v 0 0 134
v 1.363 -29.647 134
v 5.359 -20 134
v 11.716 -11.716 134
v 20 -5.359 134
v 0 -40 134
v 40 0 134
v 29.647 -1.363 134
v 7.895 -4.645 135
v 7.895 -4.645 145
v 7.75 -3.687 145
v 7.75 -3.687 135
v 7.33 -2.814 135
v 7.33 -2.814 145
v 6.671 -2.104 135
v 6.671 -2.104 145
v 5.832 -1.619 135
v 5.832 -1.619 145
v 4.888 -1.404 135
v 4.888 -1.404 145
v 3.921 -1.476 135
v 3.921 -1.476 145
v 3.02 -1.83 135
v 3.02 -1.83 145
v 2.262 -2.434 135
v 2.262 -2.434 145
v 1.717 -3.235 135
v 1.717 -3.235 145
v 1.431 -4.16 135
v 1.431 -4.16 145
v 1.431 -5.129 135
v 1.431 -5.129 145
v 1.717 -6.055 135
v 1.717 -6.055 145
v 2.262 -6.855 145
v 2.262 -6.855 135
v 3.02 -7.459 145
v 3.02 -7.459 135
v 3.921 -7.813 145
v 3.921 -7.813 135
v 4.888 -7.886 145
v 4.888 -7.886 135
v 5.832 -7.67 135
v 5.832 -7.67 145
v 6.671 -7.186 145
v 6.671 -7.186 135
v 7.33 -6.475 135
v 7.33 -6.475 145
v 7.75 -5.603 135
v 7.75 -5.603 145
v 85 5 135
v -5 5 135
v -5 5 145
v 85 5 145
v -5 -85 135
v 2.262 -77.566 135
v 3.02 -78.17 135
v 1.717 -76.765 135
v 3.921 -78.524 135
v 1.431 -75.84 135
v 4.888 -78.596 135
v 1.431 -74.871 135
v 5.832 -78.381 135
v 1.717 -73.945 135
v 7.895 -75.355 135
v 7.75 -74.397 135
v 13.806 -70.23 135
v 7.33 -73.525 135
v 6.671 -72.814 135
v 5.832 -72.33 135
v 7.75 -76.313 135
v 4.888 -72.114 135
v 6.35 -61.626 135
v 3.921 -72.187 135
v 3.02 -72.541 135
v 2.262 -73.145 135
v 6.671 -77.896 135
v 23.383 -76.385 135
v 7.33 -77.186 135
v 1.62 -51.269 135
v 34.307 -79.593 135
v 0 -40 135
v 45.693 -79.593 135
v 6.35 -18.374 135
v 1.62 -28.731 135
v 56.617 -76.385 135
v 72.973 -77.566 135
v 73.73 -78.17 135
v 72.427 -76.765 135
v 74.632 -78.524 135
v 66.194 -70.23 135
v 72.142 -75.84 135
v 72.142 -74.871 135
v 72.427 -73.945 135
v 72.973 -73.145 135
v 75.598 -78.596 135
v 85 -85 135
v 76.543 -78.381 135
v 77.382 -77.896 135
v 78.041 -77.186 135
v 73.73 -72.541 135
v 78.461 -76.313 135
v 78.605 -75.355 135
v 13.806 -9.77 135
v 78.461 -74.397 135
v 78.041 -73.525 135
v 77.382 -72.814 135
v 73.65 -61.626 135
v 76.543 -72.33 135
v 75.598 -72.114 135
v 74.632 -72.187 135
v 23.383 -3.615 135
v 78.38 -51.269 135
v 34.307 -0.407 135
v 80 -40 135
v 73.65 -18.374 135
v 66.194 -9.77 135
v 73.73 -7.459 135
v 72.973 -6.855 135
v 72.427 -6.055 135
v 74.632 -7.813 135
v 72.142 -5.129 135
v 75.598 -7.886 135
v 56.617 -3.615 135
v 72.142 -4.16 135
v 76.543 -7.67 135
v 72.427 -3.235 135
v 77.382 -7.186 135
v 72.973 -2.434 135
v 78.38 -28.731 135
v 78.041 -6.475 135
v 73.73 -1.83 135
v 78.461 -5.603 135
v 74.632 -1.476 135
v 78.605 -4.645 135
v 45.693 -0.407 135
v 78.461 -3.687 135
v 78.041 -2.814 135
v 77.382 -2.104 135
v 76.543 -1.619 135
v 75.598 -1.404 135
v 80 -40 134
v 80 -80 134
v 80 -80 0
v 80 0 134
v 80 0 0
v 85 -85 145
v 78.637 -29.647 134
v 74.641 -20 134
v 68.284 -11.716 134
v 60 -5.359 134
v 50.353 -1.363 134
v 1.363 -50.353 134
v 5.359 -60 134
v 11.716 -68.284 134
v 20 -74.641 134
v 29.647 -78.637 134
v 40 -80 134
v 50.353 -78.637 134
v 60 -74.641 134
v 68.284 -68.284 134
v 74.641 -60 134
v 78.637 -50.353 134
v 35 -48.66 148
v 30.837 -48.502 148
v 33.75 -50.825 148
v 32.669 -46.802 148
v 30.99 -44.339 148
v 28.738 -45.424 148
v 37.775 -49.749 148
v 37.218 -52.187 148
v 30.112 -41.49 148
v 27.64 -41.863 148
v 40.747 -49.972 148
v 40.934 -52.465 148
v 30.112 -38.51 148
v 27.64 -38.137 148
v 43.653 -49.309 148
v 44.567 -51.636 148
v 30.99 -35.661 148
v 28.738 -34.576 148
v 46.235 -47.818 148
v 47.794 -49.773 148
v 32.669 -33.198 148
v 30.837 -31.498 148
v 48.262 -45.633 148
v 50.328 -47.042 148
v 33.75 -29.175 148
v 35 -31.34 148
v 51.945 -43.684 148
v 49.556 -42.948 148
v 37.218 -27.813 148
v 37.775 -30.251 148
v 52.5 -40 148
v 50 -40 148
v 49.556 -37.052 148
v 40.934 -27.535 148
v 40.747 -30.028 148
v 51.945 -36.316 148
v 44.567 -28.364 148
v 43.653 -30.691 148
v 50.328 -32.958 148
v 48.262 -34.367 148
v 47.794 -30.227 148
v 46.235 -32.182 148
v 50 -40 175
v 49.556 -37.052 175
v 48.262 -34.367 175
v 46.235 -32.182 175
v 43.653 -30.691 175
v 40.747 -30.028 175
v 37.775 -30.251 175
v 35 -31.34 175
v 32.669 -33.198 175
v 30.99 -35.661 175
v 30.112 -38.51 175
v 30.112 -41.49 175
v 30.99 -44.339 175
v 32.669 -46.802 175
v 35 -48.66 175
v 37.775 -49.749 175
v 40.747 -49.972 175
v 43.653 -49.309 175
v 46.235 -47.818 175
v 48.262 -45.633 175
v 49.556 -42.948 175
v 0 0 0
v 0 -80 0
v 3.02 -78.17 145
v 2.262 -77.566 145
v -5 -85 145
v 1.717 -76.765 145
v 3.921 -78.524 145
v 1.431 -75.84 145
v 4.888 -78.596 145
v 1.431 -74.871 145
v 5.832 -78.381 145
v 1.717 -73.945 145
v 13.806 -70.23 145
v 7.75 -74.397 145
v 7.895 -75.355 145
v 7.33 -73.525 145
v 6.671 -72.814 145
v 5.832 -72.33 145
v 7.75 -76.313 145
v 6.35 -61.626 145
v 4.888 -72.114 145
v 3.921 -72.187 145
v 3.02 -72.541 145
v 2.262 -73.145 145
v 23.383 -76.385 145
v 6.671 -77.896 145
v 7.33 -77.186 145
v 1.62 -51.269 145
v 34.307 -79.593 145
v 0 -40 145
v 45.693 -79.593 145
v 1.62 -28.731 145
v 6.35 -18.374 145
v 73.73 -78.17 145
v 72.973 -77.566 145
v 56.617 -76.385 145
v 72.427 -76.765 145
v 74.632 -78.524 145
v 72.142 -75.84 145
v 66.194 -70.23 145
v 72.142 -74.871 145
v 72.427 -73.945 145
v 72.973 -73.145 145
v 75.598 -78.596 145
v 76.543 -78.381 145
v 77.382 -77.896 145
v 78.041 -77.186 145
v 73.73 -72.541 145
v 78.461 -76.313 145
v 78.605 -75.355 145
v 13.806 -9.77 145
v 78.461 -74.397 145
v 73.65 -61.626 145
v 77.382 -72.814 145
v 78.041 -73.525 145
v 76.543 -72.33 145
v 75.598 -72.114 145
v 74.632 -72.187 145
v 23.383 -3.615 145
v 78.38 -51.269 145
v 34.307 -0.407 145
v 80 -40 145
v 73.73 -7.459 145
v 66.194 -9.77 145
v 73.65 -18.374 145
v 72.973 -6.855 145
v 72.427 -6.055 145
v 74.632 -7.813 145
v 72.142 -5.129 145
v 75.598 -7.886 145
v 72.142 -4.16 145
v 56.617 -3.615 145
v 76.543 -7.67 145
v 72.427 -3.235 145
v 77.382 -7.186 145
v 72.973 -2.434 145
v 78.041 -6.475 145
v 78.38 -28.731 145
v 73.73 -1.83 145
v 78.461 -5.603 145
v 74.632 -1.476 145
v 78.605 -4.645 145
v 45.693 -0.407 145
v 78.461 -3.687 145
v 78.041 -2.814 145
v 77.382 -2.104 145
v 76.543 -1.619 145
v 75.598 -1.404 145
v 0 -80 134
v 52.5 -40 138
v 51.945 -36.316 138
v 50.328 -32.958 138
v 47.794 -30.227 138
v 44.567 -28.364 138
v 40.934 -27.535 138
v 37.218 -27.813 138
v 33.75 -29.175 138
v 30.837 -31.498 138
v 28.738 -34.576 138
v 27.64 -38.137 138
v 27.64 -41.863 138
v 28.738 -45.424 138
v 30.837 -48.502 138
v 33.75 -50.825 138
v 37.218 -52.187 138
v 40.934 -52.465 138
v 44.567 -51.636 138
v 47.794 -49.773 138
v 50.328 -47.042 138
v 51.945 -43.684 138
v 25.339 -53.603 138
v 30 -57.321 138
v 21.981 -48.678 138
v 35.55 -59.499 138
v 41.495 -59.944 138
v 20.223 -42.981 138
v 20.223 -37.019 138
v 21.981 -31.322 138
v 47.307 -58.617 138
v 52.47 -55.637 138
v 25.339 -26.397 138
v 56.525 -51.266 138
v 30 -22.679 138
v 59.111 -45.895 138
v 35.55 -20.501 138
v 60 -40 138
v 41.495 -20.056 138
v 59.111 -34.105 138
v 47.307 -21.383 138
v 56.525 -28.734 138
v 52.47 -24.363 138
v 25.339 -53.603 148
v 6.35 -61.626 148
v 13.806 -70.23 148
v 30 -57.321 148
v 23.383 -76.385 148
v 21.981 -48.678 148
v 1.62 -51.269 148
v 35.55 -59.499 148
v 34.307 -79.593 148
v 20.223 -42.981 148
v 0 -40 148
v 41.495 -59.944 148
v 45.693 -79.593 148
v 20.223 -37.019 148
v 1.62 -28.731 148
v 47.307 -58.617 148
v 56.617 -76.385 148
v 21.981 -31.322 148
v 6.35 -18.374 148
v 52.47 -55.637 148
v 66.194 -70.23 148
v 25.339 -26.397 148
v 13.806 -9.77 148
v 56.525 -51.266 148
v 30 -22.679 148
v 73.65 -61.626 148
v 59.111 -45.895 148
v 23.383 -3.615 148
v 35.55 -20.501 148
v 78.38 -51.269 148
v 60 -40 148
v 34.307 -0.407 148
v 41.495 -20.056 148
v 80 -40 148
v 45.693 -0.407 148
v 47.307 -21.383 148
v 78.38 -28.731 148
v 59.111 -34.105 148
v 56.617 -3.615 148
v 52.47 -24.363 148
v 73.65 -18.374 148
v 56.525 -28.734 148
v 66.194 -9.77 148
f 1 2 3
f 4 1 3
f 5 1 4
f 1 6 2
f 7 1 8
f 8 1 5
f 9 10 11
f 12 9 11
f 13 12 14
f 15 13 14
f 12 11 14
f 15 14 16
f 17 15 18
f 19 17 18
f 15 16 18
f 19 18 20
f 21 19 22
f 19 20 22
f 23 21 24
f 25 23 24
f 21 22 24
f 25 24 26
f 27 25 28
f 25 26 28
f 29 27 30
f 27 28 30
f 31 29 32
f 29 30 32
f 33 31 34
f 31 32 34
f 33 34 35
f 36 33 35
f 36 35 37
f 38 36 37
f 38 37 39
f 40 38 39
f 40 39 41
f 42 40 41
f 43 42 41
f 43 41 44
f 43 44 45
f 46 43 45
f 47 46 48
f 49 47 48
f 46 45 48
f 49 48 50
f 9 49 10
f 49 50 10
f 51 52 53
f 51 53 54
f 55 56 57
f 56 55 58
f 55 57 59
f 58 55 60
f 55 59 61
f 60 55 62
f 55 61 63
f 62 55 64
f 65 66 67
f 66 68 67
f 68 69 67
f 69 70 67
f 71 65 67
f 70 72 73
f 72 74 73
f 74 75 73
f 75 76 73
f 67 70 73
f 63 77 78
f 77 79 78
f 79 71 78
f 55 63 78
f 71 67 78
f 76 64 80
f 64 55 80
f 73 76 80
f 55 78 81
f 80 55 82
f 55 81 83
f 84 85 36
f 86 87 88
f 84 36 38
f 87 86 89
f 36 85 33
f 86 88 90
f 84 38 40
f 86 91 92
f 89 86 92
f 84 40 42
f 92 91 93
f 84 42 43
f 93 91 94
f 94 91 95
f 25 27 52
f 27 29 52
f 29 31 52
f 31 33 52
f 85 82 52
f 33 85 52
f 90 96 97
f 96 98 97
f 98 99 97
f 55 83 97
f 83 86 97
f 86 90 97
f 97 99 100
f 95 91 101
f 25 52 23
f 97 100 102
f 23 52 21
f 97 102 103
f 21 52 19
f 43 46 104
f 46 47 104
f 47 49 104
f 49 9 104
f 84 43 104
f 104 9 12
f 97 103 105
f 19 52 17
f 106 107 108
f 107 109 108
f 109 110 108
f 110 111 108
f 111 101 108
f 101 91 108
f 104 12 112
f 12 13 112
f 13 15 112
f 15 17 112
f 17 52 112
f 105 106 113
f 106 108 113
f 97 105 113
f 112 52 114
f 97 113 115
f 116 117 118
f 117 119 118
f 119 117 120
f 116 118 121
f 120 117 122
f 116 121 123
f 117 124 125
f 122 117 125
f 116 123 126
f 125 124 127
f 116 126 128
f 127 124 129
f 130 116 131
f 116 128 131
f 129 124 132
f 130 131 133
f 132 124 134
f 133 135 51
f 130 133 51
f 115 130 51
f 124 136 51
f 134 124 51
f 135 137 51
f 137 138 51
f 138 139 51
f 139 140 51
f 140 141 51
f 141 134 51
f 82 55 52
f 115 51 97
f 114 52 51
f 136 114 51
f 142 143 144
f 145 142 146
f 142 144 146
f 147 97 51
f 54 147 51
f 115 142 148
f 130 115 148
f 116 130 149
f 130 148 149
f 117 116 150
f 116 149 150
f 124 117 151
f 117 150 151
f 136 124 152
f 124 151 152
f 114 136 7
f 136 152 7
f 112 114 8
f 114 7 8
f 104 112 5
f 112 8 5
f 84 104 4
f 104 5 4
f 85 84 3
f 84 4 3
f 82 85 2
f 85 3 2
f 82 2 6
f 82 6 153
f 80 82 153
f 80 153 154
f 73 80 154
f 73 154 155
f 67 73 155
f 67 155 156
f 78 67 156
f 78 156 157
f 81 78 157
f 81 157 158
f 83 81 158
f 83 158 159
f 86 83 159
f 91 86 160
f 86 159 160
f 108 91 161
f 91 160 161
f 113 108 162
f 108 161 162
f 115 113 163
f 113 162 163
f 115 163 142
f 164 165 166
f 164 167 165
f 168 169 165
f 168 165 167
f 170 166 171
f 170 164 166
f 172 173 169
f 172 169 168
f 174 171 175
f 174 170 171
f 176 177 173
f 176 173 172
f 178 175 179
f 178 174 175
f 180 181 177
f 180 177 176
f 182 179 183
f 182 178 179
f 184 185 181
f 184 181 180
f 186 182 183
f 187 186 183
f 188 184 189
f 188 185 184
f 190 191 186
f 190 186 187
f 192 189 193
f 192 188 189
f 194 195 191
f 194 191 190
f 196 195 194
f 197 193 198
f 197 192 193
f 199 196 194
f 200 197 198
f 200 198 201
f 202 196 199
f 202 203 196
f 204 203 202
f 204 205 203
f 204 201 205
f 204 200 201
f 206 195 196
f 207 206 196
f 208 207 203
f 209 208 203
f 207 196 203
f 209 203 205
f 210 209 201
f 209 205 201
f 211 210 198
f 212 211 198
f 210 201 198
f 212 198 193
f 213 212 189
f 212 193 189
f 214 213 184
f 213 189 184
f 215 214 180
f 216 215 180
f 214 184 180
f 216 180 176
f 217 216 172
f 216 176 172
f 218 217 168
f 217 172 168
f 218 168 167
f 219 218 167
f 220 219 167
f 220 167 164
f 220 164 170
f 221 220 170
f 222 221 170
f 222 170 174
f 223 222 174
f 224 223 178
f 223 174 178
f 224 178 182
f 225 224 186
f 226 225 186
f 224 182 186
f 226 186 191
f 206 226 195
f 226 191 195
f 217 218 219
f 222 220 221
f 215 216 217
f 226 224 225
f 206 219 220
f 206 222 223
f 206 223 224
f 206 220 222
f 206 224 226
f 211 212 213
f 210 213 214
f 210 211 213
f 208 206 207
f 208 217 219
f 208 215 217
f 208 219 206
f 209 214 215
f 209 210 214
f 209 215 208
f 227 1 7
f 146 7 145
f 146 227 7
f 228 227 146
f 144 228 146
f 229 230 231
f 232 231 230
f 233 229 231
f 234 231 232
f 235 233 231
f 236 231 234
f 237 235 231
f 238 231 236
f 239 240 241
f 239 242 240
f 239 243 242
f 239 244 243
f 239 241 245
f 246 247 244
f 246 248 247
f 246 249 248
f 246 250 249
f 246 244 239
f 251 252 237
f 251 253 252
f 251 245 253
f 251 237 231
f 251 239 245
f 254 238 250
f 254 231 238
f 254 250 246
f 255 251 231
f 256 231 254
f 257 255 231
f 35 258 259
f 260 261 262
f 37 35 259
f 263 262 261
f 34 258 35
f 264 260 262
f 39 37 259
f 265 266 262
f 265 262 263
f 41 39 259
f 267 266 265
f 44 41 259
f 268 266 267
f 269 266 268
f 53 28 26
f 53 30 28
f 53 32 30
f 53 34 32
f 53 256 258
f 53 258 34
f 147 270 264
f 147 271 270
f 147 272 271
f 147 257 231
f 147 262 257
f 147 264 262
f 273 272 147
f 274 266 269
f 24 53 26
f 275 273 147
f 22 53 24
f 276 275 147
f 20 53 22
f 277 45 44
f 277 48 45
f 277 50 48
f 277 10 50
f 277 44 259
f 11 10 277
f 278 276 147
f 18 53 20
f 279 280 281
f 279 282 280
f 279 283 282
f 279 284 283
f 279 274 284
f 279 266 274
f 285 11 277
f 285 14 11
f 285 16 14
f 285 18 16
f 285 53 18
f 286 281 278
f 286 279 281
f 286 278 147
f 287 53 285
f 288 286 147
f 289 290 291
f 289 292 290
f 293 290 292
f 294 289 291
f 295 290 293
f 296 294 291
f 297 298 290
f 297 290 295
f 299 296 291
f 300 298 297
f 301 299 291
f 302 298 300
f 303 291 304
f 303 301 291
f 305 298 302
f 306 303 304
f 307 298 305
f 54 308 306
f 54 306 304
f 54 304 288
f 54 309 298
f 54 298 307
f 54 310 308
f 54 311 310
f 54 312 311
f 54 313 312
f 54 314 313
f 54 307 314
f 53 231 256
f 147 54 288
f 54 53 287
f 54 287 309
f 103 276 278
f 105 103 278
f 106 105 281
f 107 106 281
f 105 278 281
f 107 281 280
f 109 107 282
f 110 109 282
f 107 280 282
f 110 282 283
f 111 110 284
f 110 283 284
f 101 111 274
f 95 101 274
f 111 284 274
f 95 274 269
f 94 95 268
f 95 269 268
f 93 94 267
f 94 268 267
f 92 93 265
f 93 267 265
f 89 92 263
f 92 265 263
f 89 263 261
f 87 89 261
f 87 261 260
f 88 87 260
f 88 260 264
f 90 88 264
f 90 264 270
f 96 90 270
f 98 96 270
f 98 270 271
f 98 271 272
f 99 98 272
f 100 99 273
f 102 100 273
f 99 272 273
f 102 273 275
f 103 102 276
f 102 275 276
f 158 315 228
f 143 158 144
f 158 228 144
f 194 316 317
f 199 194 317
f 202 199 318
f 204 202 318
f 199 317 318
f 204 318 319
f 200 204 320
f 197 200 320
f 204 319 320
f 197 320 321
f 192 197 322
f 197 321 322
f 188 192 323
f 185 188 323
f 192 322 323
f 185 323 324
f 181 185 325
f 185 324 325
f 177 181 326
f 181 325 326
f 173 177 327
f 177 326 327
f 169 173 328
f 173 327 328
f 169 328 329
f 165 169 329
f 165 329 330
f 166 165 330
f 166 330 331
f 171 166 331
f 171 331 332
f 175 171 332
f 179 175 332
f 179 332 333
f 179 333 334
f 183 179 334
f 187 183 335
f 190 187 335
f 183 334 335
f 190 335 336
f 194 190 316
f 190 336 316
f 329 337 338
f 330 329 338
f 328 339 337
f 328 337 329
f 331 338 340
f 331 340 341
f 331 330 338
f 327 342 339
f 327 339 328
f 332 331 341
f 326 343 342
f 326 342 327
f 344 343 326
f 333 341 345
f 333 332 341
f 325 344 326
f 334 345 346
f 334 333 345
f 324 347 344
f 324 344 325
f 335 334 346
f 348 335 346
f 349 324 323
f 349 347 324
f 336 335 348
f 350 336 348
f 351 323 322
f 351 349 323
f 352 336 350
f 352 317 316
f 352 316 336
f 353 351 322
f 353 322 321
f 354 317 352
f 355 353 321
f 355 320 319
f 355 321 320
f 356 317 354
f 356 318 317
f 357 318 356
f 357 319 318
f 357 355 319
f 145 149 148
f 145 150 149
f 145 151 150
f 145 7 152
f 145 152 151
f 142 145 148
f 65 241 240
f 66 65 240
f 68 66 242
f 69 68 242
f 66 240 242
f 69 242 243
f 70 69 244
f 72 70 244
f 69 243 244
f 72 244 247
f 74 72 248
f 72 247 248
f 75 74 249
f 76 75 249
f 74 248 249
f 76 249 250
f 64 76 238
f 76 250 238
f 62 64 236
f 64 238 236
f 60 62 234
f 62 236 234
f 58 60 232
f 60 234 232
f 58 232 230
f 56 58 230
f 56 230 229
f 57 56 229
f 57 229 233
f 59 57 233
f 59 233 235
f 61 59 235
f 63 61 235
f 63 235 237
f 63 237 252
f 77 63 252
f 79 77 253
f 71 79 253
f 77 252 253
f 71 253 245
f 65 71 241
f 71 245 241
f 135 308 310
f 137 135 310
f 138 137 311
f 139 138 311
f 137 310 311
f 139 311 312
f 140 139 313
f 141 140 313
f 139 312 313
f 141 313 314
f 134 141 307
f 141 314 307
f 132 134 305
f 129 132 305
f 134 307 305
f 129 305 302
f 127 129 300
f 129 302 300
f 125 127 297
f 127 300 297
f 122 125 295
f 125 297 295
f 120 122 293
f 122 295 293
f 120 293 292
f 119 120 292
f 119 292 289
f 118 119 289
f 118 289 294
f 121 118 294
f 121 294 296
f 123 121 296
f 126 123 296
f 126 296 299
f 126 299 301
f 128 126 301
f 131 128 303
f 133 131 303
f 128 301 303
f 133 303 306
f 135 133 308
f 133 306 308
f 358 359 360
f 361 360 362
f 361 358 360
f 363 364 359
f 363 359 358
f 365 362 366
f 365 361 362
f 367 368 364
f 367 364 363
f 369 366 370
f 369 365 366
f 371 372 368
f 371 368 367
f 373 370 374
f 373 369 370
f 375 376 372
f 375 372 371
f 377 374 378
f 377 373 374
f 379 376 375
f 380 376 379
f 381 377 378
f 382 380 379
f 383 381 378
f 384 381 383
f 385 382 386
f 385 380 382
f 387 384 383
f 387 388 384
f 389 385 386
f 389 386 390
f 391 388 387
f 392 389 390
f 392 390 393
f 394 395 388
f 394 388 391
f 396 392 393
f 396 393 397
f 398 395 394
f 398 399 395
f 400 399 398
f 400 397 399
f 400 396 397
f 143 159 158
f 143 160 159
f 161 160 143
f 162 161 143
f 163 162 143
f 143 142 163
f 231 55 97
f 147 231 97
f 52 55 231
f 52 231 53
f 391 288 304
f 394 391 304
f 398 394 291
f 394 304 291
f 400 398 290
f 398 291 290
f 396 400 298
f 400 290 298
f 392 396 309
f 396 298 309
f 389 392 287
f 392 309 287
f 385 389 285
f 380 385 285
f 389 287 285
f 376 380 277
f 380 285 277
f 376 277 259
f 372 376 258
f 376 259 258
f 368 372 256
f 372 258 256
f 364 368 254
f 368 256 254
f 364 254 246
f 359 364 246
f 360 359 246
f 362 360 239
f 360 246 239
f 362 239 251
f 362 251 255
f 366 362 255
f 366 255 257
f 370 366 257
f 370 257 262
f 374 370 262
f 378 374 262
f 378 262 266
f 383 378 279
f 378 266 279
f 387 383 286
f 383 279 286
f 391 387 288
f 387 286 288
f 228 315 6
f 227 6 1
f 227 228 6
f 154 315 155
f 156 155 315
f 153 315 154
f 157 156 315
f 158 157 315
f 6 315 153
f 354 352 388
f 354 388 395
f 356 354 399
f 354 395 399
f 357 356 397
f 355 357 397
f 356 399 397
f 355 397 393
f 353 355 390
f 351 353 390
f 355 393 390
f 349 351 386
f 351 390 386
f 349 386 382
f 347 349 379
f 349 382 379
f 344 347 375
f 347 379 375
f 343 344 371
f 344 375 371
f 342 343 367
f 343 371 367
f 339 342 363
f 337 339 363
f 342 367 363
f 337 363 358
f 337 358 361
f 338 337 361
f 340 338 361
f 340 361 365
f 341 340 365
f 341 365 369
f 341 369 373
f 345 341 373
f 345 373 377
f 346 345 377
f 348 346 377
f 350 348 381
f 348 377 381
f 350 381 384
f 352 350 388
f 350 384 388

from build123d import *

# Parameters (mm, degrees)
SKETCH_1_W          = 80
SKETCH_1_H          = 80
EXTRUDE_1_DEPTH     = 134
SKETCH_2_R          = 40
EXTRUDE_2_DEPTH     = 1
SKETCH_3_W          = 90
SKETCH_3_H          = 90
EXTRUDE_3_DEPTH     = 10
SKETCH_4_R          = 40
EXTRUDE_4_DEPTH     = 3
SKETCH_5_R          = 20
CUT_EXTRUDE_1_DEPTH = 10
SKETCH_6_R          = 12.5
EXTRUDE_5_DEPTH     = 10
SKETCH_7_R          = 10
EXTRUDE_6_DEPTH     = 27
SKETCH_9_R          = 3.25
CUT_EXTRUDE_2_DEPTH = 10


with BuildPart() as part:
    # 草图1 → 拉伸1 (new body)
    with BuildSketch(Plane.XY):
        with Locations((40, -40)):
            Rectangle(SKETCH_1_W, SKETCH_1_H)
    extrude(amount=EXTRUDE_1_DEPTH)

    # 草图2 → 拉伸2 (add)
    with BuildSketch(Plane.XY.offset(134)):
        with Locations((40, -40)):
            Circle(SKETCH_2_R)
    extrude(amount=EXTRUDE_2_DEPTH)

    # 草图3 → 拉伸3 (add)
    with BuildSketch(Plane.XY.offset(135)):
        with Locations((40, -40)):
            Rectangle(SKETCH_3_W, SKETCH_3_H)
    extrude(amount=EXTRUDE_3_DEPTH)

    # 草图4 → 拉伸4 (add)
    with BuildSketch(Plane.XY.offset(145)):
        with Locations((40, -40)):
            Circle(SKETCH_4_R)
    extrude(amount=EXTRUDE_4_DEPTH)

    # 草图5 → 切除-拉伸1 (cut)
    with BuildSketch(Plane.XY.offset(148)):
        with Locations((40, -40)):
            Circle(SKETCH_5_R)
    extrude(amount=-CUT_EXTRUDE_1_DEPTH, mode=Mode.SUBTRACT)

    # 草图6 → 拉伸5 (add)
    with BuildSketch(Plane.XY.offset(138)):
        with Locations((40, -40)):
            Circle(SKETCH_6_R)
    extrude(amount=EXTRUDE_5_DEPTH)

    # 草图7 → 拉伸6 (add)
    with BuildSketch(Plane.XY.offset(148)):
        with Locations((40, -40)):
            Circle(SKETCH_7_R)
    extrude(amount=EXTRUDE_6_DEPTH)

    # 草图9 → 切除-拉伸2 (cut)
    with BuildSketch(Plane.XY.offset(145)):
        with Locations((75.355339059, -4.644660941)):
            Circle(SKETCH_9_R)
        with Locations((75.355339059, -75.355339059)):
            Circle(SKETCH_9_R)
        with Locations((4.644660941, -75.355339059)):
            Circle(SKETCH_9_R)
        with Locations((4.644660941, -4.644660941)):
            Circle(SKETCH_9_R)
    extrude(amount=-CUT_EXTRUDE_2_DEPTH, mode=Mode.SUBTRACT)


solid = part.part
